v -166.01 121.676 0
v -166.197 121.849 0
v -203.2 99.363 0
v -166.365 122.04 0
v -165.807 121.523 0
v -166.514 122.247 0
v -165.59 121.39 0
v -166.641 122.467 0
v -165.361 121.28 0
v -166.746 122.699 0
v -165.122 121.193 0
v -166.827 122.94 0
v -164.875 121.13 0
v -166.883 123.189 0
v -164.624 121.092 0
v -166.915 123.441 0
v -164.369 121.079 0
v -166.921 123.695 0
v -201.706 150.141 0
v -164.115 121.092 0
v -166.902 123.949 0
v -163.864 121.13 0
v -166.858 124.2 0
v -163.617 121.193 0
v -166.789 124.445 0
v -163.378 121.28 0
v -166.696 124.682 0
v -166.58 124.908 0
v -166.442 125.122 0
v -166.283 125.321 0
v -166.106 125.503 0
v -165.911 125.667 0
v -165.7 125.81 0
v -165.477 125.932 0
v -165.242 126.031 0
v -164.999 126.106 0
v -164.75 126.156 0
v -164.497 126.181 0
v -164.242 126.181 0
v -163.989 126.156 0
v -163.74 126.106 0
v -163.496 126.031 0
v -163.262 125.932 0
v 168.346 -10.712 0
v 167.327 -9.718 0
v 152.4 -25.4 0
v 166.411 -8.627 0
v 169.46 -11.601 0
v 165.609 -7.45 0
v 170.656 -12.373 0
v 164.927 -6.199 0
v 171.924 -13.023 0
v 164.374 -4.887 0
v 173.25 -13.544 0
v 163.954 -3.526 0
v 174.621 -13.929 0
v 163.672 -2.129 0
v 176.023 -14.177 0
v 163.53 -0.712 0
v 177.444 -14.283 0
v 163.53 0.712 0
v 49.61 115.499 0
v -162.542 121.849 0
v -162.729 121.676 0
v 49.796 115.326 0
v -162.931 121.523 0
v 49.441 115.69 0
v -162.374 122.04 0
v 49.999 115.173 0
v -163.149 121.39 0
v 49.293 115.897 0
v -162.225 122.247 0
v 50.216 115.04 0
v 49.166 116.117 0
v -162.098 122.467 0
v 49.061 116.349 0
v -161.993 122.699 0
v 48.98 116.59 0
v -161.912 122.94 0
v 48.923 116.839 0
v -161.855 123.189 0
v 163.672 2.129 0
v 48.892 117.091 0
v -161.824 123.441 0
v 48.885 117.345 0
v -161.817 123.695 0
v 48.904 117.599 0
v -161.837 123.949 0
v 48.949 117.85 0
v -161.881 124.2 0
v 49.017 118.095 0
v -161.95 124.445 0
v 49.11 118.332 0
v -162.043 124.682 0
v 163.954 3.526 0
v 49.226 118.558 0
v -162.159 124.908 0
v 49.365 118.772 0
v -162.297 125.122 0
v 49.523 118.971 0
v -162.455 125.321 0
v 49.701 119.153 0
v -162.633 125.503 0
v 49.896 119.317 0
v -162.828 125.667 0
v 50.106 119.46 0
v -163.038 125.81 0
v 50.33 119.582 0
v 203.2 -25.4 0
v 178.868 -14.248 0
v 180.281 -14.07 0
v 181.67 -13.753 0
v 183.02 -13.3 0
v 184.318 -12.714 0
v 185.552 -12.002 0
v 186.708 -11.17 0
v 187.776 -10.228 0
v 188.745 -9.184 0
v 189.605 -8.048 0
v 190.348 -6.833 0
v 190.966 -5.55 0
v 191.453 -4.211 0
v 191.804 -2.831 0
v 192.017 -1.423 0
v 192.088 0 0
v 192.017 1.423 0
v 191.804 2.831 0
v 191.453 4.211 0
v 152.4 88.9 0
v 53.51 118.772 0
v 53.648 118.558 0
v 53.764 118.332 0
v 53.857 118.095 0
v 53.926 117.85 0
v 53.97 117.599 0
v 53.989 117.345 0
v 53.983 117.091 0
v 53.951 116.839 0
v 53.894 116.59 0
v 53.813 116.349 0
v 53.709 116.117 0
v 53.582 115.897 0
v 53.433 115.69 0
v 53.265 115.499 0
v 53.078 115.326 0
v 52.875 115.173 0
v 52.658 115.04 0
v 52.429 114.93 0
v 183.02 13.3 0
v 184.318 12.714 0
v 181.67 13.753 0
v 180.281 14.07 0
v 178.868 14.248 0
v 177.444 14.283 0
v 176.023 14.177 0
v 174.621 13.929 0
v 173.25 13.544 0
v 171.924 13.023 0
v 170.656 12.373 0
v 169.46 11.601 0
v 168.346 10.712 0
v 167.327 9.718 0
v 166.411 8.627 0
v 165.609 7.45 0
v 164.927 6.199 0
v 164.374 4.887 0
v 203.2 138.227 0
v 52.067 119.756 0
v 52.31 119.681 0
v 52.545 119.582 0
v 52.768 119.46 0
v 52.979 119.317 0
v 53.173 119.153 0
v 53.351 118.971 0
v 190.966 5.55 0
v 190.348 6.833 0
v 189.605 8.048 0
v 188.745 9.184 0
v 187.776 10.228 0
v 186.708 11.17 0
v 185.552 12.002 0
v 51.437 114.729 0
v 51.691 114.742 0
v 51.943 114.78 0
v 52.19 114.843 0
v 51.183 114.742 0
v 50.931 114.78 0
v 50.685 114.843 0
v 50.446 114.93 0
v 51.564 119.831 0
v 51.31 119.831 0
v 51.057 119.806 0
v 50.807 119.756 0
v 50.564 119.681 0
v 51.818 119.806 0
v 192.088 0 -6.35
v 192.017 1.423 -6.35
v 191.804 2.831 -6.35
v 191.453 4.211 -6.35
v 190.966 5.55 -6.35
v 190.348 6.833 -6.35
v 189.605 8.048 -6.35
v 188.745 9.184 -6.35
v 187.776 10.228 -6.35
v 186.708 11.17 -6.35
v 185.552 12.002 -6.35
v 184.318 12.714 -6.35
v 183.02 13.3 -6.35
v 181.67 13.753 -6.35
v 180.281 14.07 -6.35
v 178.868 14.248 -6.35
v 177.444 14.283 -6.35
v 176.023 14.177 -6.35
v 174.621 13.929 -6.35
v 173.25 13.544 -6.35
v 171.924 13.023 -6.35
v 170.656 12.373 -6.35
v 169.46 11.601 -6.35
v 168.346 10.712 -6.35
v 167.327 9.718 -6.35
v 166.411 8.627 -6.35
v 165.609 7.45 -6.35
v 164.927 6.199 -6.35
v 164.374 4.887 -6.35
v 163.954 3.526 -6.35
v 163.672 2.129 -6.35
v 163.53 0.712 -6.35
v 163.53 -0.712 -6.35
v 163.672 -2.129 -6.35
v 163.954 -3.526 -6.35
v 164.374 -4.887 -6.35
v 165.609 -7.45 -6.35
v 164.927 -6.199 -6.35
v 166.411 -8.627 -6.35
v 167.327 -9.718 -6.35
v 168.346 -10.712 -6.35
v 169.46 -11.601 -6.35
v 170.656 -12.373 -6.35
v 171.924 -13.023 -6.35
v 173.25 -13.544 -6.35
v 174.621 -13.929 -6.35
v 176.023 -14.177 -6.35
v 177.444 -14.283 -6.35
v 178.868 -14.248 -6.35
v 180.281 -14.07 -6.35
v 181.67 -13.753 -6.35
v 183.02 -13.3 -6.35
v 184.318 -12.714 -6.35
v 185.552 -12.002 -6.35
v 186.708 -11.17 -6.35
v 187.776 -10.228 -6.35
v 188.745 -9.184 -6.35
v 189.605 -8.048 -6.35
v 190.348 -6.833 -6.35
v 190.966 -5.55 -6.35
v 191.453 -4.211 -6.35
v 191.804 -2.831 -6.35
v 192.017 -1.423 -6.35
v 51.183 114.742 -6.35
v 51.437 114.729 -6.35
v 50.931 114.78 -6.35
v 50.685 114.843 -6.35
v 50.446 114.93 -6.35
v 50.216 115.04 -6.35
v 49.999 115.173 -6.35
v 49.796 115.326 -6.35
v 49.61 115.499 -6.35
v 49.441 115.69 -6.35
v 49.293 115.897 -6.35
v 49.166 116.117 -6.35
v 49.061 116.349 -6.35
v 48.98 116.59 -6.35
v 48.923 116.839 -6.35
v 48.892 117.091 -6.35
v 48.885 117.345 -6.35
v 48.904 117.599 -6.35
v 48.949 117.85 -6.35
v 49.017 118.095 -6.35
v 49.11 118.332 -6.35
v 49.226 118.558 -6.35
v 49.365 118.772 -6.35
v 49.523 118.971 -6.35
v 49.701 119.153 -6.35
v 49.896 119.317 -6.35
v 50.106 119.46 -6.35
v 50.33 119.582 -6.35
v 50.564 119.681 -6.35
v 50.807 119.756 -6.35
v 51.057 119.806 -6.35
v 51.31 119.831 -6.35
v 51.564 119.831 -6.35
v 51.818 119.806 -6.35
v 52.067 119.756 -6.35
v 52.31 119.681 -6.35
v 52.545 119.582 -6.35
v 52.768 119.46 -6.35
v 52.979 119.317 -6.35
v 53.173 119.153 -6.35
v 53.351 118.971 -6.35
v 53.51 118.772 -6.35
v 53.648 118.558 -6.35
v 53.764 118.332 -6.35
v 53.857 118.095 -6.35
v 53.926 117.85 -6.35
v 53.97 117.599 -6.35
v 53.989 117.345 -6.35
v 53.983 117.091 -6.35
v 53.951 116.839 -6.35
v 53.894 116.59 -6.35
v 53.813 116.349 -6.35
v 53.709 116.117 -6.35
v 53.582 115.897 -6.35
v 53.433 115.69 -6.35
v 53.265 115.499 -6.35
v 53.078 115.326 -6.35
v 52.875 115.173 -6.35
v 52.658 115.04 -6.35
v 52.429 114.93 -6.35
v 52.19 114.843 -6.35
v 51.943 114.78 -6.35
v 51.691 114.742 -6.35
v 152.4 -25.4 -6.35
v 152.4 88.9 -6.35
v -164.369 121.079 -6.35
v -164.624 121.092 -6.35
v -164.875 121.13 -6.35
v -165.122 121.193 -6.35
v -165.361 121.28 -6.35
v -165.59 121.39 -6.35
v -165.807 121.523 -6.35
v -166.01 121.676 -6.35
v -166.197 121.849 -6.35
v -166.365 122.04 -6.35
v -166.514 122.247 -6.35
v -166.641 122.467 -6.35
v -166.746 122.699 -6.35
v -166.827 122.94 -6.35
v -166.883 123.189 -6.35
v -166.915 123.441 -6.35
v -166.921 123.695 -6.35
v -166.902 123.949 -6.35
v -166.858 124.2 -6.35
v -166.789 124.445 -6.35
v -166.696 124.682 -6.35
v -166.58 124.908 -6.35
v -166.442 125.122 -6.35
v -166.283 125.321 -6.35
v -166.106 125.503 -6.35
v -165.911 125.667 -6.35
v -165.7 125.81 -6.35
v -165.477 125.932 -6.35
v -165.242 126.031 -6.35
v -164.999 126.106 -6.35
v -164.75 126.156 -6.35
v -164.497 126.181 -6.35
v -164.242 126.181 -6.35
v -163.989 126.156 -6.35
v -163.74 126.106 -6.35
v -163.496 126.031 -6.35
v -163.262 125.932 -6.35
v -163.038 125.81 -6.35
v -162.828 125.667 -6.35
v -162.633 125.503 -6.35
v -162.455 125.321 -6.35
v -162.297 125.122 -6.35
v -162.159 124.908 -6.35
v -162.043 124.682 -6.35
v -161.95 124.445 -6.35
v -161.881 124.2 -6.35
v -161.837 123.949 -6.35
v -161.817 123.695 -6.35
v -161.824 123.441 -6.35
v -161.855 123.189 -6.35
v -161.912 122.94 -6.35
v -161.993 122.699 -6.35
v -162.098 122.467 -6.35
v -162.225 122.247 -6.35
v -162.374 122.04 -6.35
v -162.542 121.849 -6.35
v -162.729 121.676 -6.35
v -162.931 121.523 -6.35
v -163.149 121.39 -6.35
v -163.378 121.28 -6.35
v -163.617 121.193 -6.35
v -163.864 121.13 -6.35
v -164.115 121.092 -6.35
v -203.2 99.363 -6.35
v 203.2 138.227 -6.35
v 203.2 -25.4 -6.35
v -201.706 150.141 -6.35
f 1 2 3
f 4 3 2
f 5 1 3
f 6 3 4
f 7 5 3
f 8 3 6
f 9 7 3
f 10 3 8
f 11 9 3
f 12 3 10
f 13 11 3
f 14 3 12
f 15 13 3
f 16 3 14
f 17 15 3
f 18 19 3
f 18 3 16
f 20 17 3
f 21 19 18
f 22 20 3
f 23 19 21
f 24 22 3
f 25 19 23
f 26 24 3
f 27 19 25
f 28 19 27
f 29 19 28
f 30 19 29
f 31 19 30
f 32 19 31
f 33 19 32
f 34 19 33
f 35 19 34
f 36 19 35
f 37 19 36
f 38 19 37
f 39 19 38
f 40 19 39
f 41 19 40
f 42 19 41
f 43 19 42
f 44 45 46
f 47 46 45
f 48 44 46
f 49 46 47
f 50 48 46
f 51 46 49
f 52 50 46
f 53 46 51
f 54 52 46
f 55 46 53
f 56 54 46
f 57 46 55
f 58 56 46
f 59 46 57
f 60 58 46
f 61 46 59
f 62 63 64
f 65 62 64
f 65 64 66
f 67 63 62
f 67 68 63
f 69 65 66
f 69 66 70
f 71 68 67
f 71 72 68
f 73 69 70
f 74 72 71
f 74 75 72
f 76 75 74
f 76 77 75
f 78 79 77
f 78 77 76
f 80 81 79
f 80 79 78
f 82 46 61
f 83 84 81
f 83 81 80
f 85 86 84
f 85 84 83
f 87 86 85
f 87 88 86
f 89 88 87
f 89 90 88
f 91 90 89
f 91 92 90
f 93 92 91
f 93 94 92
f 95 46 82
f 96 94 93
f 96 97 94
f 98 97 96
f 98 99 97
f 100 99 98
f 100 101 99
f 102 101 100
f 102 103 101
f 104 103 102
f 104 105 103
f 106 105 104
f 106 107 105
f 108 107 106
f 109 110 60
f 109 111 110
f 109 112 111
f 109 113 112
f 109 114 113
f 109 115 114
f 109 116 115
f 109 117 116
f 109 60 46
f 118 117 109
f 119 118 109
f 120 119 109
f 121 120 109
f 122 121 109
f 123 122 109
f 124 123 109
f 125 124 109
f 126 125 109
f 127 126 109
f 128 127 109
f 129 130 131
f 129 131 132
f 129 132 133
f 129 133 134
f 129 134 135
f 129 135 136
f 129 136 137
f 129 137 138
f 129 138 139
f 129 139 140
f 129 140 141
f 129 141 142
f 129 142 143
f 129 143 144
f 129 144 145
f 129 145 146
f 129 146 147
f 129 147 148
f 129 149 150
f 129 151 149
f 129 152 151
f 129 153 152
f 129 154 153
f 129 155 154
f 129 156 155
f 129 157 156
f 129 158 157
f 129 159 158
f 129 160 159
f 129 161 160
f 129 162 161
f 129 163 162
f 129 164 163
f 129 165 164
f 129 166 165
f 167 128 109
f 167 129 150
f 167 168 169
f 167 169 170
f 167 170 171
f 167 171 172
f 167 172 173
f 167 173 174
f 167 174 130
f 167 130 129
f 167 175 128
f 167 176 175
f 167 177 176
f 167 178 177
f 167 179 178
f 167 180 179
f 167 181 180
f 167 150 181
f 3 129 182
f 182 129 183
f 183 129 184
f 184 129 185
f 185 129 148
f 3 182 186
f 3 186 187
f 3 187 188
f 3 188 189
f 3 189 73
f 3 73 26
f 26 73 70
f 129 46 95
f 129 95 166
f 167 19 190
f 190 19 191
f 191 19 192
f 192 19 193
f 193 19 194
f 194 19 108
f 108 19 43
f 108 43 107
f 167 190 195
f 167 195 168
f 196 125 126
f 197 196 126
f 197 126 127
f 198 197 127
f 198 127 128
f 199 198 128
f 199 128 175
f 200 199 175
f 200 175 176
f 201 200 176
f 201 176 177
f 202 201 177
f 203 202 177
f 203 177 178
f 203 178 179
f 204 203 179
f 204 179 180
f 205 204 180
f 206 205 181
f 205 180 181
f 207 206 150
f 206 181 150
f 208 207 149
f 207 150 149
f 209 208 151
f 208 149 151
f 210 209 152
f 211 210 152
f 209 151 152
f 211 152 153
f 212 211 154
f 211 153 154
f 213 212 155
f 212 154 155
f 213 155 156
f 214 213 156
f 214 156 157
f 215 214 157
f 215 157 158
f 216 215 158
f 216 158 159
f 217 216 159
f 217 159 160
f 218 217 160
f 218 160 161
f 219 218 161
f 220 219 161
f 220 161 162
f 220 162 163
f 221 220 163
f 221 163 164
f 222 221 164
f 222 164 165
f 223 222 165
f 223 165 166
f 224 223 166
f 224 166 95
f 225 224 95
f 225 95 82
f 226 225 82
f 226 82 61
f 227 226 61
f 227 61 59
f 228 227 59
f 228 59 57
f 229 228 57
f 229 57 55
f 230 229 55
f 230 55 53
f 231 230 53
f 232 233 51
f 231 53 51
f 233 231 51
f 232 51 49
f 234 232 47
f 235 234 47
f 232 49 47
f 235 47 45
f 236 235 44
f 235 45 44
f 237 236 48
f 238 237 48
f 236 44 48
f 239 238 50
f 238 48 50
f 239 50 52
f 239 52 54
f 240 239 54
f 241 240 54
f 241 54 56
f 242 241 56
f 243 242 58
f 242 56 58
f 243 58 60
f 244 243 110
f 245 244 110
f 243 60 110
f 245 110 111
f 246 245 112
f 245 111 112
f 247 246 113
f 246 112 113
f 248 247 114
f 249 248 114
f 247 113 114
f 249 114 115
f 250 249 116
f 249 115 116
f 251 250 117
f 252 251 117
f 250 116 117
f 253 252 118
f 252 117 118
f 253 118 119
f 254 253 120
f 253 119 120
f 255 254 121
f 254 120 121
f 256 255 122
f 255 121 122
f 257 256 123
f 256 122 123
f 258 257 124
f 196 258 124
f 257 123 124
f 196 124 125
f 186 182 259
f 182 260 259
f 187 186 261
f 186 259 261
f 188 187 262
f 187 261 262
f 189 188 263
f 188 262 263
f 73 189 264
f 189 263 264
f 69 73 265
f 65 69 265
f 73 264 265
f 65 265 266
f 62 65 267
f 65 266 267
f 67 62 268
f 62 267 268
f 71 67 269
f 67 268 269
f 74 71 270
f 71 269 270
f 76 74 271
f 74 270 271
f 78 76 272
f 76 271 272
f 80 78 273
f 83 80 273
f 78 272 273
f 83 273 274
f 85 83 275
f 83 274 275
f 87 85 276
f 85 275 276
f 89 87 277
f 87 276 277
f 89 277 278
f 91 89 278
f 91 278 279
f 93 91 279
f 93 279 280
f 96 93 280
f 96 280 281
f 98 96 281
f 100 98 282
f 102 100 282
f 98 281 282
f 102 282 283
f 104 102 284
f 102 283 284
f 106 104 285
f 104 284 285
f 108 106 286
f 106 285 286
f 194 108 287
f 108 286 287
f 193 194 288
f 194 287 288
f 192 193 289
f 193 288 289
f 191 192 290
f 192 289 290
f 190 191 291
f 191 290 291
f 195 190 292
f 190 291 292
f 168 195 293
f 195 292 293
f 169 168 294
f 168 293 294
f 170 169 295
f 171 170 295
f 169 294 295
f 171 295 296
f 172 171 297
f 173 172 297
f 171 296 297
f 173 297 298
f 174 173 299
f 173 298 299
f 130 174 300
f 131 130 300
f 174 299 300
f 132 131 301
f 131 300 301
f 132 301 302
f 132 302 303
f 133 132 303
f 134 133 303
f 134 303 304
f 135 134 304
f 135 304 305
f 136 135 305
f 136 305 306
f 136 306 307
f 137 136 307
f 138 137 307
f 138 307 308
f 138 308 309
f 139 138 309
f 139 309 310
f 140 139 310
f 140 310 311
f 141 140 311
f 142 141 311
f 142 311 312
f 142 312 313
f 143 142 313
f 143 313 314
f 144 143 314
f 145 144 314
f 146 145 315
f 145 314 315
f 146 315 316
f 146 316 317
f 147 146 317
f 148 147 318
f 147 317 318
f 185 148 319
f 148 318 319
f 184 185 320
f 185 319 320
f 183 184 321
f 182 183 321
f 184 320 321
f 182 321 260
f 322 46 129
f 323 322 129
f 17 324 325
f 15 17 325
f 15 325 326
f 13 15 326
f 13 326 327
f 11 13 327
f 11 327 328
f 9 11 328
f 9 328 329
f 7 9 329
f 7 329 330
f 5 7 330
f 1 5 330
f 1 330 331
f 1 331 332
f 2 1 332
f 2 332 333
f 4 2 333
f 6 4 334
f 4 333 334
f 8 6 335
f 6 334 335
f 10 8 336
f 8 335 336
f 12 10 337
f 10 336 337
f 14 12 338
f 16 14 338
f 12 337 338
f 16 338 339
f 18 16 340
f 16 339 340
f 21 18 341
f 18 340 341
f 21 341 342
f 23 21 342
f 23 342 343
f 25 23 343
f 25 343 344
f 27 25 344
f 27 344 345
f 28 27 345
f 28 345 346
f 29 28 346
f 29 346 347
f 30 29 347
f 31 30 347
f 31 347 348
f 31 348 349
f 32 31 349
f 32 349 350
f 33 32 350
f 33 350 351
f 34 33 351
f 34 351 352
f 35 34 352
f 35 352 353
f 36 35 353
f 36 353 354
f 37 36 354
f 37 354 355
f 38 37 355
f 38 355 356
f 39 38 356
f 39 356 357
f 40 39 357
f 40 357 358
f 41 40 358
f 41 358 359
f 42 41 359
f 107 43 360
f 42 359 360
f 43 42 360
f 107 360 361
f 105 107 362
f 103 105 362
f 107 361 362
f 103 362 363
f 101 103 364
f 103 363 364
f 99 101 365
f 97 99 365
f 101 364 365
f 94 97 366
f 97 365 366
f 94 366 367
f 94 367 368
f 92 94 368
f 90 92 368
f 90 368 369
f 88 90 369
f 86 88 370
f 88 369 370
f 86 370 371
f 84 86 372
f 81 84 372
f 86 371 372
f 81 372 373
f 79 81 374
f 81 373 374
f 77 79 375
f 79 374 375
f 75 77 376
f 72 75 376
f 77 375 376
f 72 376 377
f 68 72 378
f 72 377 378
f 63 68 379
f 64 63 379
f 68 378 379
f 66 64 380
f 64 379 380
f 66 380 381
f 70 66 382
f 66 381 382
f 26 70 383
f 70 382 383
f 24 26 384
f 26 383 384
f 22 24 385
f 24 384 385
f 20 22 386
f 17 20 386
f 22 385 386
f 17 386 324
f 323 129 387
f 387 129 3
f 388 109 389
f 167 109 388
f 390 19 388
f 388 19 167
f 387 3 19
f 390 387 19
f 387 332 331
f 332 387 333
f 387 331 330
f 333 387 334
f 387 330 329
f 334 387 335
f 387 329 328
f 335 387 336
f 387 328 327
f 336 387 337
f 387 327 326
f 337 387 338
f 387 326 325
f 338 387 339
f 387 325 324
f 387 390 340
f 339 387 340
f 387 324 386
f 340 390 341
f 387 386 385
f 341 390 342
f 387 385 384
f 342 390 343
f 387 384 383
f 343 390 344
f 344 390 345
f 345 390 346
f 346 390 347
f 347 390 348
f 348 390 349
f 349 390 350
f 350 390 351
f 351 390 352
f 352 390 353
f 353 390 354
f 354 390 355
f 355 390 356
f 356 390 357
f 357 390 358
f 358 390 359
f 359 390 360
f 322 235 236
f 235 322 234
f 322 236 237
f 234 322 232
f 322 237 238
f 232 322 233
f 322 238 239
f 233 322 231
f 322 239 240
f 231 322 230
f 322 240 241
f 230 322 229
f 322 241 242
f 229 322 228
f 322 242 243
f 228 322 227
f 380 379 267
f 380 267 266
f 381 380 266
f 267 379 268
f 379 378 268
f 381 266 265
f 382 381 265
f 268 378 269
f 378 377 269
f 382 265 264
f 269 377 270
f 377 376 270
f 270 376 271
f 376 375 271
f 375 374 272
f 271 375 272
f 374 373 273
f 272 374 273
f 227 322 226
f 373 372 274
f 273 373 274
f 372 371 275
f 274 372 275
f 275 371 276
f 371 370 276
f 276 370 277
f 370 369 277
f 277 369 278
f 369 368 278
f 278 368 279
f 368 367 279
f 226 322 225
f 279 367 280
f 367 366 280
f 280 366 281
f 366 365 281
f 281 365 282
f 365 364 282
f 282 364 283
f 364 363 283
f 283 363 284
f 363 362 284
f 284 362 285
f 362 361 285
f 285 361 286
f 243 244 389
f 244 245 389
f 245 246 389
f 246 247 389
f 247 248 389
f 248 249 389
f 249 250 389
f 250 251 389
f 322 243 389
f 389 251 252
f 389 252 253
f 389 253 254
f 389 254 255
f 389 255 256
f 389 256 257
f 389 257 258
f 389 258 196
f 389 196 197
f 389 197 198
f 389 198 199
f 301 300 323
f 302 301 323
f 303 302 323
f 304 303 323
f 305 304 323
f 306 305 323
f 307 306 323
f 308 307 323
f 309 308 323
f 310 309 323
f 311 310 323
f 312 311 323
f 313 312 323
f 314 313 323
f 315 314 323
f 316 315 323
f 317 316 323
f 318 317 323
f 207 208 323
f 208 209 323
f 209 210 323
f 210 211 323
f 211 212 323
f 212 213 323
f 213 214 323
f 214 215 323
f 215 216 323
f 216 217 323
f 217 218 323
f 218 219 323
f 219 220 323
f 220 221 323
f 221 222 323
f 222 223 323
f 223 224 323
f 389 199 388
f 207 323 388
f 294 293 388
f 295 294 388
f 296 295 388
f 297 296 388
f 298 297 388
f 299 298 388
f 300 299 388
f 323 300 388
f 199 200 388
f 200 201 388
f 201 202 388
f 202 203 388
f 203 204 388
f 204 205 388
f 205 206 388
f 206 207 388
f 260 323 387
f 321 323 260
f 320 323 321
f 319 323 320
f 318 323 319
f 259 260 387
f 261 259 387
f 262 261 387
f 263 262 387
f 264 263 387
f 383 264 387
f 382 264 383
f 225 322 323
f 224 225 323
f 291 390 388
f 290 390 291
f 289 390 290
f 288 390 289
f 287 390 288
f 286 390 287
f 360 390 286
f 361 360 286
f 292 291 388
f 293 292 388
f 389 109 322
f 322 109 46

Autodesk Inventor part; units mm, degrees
ref_plane "YZ Plane" through (0, 0, 0) normal (1, 0, 0) x (0, 1, 0)
ref_plane "XZ Plane" through (0, 0, 0) normal (0, 1, 0) x (-1, 0, 0)
ref_plane "XY Plane" through (0, 0, 0) normal (0, 0, 1) x (1, 0, 0)
sketch "Sketch1" plane through (0, 0, 0) normal (0, 0, 1) x (1, 0, 0)
  line L0 (-203.2, -25.4) -> (203.2, -25.4) construction
  line L1 (203.2, -25.4) -> (203.2, 25.4) construction
  line L2 (203.2, 25.4) -> (-203.2, 25.4) construction
  line L3 (-203.2, 25.4) -> (-203.2, -25.4) construction
  line L4 (-203.2, -25.4) -> (203.2, 25.4) construction
  line L5 (203.2, -25.4) -> (-203.2, 25.4) construction
  circle A0 centre (-164.3694, 123.6318) radius 14.2875 construction
  circle A1 centre (51.4372, 117.2818) radius 14.2875 construction
  line L6 (-157.3708, -518.3539) -> (-157.3708, -1127.9539) construction
  line L7 (-157.3708, -1127.9539) -> (29.9542, -1127.9539) construction
  line L8 (29.9542, -1127.9539) -> (29.9542, -518.3539) construction
  line L9 (29.9542, -518.3539) -> (-157.3708, -518.3539) construction
  line L10 (-164.3694, 123.6318) -> (51.4372, 117.2818) construction
  circle A2 centre (177.8, 0) radius 14.2875
  line L11 (203.2, -25.4) -> (152.4, -25.4)
  line L12 (203.2, -25.4) -> (203.2, 138.2272)
  line L13 (152.4, -25.4) -> (152.4, 88.9)
  line L14 (152.4, 88.9) -> (-203.2, 99.3634)
  line L15 (-203.2, 99.3634) -> (-201.7059, 150.1414)
  line L16 (-201.7059, 150.1414) -> (203.2, 138.2272)
  point P0 (0, 0)
  point P1 (-203.2, 0)
  point P2 (203.2, 0)
  dimension "d0" = 406.4
  dimension "d1" = 50.8
  dimension "d2" = 28.575
  dimension "d3" = 28.575
  dimension "d4" = 187.325
  dimension "d5" = 609.6
  dimension "d6" = 215.9
  dimension "d7" = 6.35
  dimension "d10" = 28.575
  dimension "d11" = 25.4
  dimension "d21" = 50.8
  dimension "d22" = 25.4
  dimension "d23" = 38.1
  dimension "d24" = 114.3
  dimension "d25" = 50.8
extrude "Extrusion1" add sketch "Sketch1" against normal blind 6.35
hole "Hole1" at (51.4372, 117.2818, 0) at (-164.3694, 123.6318, 0) direction (0, 0, -1) diameter 5.1054 end through all clearance for "Flat Head Machine Screw (82)" size "#10" standard "Ansi Unified Screw Threads"
properties part number "CL2-004" material "Aluminum 6061"
